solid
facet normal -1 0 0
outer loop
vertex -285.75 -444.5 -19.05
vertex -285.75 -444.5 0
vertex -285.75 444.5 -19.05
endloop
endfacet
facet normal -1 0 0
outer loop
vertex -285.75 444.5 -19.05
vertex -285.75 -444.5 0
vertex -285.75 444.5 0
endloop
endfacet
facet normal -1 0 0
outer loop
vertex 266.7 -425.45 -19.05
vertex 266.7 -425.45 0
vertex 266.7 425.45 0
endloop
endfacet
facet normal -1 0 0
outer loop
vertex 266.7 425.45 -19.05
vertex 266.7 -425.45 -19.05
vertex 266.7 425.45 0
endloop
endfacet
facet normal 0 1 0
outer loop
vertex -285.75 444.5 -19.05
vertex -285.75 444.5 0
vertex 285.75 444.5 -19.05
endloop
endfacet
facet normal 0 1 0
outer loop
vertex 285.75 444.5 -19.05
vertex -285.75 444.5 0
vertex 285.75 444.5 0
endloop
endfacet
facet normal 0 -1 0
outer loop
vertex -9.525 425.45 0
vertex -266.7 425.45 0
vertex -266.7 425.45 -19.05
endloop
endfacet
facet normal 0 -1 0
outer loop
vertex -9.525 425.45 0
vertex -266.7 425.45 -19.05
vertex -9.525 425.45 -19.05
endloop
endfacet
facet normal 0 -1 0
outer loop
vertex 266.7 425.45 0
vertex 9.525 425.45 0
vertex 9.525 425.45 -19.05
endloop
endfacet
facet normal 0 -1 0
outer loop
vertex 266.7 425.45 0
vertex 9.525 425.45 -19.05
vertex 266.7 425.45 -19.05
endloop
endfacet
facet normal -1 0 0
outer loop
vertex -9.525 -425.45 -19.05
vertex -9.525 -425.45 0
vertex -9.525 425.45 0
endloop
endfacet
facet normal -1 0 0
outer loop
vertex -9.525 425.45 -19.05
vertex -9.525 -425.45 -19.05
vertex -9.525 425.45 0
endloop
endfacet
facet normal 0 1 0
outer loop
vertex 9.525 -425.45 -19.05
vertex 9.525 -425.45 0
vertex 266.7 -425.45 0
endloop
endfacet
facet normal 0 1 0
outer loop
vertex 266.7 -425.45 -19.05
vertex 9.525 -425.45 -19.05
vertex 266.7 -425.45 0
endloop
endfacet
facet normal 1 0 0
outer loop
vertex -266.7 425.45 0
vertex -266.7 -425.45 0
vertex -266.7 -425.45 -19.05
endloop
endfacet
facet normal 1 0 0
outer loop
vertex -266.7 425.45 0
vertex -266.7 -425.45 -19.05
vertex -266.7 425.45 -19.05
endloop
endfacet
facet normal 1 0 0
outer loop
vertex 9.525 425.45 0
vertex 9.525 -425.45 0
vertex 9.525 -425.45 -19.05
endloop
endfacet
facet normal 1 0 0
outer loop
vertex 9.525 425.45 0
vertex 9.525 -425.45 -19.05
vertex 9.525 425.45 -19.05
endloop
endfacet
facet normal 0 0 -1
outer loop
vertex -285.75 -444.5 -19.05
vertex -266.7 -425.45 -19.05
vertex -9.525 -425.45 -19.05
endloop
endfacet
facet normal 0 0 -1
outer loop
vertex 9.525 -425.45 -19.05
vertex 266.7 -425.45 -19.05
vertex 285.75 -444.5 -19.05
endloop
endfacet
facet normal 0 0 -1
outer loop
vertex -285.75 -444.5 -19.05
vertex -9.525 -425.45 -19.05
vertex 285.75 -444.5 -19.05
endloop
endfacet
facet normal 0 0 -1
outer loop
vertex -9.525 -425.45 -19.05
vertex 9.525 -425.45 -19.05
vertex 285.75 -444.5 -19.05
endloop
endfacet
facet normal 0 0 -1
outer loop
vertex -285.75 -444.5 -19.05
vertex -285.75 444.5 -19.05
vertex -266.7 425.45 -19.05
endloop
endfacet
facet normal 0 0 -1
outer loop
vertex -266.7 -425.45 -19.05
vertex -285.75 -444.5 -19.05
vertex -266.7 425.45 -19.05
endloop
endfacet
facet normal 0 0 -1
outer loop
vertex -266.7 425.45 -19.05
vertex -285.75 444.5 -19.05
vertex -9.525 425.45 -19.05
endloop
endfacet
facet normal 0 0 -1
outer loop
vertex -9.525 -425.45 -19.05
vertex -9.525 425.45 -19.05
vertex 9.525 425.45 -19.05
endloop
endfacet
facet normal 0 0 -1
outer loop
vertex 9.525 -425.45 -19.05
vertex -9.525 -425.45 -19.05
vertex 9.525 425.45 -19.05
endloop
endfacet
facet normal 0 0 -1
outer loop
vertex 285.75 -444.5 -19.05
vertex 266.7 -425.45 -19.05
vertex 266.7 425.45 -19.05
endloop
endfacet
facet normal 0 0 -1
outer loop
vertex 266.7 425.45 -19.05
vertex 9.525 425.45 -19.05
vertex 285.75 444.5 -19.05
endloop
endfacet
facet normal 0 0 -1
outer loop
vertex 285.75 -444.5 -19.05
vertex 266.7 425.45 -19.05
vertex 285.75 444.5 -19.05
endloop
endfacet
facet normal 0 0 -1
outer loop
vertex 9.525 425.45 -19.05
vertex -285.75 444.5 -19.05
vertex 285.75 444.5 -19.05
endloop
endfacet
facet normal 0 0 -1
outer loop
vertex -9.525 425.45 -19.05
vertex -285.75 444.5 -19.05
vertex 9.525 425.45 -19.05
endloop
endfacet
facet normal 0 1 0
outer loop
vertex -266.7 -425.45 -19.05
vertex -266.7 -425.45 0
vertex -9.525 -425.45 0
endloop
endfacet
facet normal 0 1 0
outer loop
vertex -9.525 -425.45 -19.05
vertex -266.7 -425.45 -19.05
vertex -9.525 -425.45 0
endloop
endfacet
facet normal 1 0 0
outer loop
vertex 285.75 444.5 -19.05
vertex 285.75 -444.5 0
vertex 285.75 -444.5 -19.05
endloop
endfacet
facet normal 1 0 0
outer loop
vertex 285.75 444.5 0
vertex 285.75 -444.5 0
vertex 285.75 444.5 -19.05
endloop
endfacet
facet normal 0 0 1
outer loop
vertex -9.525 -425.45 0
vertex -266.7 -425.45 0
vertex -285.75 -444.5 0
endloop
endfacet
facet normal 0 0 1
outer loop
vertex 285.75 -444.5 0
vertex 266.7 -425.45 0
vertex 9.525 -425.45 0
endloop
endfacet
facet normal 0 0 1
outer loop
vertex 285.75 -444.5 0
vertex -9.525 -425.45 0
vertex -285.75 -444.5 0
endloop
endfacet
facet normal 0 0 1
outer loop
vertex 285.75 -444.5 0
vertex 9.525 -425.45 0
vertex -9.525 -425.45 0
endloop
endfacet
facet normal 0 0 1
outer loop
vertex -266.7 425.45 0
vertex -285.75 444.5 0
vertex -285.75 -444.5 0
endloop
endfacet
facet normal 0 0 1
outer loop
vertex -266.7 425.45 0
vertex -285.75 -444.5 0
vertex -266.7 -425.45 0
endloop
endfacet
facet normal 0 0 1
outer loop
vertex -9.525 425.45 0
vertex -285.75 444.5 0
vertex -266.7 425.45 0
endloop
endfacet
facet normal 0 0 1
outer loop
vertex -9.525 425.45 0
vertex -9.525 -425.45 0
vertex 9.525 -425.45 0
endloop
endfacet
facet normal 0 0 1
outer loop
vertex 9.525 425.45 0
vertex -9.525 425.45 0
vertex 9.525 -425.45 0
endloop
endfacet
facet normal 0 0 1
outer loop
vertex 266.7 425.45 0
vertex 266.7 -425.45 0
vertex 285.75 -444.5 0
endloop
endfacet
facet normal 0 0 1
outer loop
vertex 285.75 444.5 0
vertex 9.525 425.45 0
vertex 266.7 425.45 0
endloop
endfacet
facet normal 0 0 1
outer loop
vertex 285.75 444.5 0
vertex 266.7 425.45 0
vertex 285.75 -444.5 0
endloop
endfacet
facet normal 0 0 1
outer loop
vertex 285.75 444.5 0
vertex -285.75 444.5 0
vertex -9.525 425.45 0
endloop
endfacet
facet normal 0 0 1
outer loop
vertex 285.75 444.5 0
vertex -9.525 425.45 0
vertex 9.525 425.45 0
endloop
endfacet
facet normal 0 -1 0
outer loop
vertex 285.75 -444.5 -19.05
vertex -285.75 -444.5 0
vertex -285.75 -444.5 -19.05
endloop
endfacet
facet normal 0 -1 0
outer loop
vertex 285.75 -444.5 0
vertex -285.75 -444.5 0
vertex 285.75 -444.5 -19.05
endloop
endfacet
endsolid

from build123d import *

# Parameters (mm, degrees)
SKETCH1_W           = 571.5
SKETCH1_H           = 889
BOSS_EXTRUDE1_DEPTH = 19.05
SKETCH2_W           = 257.175
SKETCH2_H           = 850.9
CUT_EXTRUDE1_DEPTH  = 20.05


with BuildPart() as part:
    # Sketch1 → Boss-Extrude1 (new body)
    with BuildSketch(Plane.XY):
        Rectangle(SKETCH1_W, SKETCH1_H)
    extrude(amount=-BOSS_EXTRUDE1_DEPTH)

    # Sketch2 → Cut-Extrude1 (cut, through all)
    with BuildSketch(Plane.XY):
        with Locations((-138.1125, 0)):
            Rectangle(SKETCH2_W, SKETCH2_H)
        with Locations((138.1125, 0)):
            Rectangle(SKETCH2_W, SKETCH2_H)
    extrude(amount=-CUT_EXTRUDE1_DEPTH, mode=Mode.SUBTRACT)


solid = part.part
